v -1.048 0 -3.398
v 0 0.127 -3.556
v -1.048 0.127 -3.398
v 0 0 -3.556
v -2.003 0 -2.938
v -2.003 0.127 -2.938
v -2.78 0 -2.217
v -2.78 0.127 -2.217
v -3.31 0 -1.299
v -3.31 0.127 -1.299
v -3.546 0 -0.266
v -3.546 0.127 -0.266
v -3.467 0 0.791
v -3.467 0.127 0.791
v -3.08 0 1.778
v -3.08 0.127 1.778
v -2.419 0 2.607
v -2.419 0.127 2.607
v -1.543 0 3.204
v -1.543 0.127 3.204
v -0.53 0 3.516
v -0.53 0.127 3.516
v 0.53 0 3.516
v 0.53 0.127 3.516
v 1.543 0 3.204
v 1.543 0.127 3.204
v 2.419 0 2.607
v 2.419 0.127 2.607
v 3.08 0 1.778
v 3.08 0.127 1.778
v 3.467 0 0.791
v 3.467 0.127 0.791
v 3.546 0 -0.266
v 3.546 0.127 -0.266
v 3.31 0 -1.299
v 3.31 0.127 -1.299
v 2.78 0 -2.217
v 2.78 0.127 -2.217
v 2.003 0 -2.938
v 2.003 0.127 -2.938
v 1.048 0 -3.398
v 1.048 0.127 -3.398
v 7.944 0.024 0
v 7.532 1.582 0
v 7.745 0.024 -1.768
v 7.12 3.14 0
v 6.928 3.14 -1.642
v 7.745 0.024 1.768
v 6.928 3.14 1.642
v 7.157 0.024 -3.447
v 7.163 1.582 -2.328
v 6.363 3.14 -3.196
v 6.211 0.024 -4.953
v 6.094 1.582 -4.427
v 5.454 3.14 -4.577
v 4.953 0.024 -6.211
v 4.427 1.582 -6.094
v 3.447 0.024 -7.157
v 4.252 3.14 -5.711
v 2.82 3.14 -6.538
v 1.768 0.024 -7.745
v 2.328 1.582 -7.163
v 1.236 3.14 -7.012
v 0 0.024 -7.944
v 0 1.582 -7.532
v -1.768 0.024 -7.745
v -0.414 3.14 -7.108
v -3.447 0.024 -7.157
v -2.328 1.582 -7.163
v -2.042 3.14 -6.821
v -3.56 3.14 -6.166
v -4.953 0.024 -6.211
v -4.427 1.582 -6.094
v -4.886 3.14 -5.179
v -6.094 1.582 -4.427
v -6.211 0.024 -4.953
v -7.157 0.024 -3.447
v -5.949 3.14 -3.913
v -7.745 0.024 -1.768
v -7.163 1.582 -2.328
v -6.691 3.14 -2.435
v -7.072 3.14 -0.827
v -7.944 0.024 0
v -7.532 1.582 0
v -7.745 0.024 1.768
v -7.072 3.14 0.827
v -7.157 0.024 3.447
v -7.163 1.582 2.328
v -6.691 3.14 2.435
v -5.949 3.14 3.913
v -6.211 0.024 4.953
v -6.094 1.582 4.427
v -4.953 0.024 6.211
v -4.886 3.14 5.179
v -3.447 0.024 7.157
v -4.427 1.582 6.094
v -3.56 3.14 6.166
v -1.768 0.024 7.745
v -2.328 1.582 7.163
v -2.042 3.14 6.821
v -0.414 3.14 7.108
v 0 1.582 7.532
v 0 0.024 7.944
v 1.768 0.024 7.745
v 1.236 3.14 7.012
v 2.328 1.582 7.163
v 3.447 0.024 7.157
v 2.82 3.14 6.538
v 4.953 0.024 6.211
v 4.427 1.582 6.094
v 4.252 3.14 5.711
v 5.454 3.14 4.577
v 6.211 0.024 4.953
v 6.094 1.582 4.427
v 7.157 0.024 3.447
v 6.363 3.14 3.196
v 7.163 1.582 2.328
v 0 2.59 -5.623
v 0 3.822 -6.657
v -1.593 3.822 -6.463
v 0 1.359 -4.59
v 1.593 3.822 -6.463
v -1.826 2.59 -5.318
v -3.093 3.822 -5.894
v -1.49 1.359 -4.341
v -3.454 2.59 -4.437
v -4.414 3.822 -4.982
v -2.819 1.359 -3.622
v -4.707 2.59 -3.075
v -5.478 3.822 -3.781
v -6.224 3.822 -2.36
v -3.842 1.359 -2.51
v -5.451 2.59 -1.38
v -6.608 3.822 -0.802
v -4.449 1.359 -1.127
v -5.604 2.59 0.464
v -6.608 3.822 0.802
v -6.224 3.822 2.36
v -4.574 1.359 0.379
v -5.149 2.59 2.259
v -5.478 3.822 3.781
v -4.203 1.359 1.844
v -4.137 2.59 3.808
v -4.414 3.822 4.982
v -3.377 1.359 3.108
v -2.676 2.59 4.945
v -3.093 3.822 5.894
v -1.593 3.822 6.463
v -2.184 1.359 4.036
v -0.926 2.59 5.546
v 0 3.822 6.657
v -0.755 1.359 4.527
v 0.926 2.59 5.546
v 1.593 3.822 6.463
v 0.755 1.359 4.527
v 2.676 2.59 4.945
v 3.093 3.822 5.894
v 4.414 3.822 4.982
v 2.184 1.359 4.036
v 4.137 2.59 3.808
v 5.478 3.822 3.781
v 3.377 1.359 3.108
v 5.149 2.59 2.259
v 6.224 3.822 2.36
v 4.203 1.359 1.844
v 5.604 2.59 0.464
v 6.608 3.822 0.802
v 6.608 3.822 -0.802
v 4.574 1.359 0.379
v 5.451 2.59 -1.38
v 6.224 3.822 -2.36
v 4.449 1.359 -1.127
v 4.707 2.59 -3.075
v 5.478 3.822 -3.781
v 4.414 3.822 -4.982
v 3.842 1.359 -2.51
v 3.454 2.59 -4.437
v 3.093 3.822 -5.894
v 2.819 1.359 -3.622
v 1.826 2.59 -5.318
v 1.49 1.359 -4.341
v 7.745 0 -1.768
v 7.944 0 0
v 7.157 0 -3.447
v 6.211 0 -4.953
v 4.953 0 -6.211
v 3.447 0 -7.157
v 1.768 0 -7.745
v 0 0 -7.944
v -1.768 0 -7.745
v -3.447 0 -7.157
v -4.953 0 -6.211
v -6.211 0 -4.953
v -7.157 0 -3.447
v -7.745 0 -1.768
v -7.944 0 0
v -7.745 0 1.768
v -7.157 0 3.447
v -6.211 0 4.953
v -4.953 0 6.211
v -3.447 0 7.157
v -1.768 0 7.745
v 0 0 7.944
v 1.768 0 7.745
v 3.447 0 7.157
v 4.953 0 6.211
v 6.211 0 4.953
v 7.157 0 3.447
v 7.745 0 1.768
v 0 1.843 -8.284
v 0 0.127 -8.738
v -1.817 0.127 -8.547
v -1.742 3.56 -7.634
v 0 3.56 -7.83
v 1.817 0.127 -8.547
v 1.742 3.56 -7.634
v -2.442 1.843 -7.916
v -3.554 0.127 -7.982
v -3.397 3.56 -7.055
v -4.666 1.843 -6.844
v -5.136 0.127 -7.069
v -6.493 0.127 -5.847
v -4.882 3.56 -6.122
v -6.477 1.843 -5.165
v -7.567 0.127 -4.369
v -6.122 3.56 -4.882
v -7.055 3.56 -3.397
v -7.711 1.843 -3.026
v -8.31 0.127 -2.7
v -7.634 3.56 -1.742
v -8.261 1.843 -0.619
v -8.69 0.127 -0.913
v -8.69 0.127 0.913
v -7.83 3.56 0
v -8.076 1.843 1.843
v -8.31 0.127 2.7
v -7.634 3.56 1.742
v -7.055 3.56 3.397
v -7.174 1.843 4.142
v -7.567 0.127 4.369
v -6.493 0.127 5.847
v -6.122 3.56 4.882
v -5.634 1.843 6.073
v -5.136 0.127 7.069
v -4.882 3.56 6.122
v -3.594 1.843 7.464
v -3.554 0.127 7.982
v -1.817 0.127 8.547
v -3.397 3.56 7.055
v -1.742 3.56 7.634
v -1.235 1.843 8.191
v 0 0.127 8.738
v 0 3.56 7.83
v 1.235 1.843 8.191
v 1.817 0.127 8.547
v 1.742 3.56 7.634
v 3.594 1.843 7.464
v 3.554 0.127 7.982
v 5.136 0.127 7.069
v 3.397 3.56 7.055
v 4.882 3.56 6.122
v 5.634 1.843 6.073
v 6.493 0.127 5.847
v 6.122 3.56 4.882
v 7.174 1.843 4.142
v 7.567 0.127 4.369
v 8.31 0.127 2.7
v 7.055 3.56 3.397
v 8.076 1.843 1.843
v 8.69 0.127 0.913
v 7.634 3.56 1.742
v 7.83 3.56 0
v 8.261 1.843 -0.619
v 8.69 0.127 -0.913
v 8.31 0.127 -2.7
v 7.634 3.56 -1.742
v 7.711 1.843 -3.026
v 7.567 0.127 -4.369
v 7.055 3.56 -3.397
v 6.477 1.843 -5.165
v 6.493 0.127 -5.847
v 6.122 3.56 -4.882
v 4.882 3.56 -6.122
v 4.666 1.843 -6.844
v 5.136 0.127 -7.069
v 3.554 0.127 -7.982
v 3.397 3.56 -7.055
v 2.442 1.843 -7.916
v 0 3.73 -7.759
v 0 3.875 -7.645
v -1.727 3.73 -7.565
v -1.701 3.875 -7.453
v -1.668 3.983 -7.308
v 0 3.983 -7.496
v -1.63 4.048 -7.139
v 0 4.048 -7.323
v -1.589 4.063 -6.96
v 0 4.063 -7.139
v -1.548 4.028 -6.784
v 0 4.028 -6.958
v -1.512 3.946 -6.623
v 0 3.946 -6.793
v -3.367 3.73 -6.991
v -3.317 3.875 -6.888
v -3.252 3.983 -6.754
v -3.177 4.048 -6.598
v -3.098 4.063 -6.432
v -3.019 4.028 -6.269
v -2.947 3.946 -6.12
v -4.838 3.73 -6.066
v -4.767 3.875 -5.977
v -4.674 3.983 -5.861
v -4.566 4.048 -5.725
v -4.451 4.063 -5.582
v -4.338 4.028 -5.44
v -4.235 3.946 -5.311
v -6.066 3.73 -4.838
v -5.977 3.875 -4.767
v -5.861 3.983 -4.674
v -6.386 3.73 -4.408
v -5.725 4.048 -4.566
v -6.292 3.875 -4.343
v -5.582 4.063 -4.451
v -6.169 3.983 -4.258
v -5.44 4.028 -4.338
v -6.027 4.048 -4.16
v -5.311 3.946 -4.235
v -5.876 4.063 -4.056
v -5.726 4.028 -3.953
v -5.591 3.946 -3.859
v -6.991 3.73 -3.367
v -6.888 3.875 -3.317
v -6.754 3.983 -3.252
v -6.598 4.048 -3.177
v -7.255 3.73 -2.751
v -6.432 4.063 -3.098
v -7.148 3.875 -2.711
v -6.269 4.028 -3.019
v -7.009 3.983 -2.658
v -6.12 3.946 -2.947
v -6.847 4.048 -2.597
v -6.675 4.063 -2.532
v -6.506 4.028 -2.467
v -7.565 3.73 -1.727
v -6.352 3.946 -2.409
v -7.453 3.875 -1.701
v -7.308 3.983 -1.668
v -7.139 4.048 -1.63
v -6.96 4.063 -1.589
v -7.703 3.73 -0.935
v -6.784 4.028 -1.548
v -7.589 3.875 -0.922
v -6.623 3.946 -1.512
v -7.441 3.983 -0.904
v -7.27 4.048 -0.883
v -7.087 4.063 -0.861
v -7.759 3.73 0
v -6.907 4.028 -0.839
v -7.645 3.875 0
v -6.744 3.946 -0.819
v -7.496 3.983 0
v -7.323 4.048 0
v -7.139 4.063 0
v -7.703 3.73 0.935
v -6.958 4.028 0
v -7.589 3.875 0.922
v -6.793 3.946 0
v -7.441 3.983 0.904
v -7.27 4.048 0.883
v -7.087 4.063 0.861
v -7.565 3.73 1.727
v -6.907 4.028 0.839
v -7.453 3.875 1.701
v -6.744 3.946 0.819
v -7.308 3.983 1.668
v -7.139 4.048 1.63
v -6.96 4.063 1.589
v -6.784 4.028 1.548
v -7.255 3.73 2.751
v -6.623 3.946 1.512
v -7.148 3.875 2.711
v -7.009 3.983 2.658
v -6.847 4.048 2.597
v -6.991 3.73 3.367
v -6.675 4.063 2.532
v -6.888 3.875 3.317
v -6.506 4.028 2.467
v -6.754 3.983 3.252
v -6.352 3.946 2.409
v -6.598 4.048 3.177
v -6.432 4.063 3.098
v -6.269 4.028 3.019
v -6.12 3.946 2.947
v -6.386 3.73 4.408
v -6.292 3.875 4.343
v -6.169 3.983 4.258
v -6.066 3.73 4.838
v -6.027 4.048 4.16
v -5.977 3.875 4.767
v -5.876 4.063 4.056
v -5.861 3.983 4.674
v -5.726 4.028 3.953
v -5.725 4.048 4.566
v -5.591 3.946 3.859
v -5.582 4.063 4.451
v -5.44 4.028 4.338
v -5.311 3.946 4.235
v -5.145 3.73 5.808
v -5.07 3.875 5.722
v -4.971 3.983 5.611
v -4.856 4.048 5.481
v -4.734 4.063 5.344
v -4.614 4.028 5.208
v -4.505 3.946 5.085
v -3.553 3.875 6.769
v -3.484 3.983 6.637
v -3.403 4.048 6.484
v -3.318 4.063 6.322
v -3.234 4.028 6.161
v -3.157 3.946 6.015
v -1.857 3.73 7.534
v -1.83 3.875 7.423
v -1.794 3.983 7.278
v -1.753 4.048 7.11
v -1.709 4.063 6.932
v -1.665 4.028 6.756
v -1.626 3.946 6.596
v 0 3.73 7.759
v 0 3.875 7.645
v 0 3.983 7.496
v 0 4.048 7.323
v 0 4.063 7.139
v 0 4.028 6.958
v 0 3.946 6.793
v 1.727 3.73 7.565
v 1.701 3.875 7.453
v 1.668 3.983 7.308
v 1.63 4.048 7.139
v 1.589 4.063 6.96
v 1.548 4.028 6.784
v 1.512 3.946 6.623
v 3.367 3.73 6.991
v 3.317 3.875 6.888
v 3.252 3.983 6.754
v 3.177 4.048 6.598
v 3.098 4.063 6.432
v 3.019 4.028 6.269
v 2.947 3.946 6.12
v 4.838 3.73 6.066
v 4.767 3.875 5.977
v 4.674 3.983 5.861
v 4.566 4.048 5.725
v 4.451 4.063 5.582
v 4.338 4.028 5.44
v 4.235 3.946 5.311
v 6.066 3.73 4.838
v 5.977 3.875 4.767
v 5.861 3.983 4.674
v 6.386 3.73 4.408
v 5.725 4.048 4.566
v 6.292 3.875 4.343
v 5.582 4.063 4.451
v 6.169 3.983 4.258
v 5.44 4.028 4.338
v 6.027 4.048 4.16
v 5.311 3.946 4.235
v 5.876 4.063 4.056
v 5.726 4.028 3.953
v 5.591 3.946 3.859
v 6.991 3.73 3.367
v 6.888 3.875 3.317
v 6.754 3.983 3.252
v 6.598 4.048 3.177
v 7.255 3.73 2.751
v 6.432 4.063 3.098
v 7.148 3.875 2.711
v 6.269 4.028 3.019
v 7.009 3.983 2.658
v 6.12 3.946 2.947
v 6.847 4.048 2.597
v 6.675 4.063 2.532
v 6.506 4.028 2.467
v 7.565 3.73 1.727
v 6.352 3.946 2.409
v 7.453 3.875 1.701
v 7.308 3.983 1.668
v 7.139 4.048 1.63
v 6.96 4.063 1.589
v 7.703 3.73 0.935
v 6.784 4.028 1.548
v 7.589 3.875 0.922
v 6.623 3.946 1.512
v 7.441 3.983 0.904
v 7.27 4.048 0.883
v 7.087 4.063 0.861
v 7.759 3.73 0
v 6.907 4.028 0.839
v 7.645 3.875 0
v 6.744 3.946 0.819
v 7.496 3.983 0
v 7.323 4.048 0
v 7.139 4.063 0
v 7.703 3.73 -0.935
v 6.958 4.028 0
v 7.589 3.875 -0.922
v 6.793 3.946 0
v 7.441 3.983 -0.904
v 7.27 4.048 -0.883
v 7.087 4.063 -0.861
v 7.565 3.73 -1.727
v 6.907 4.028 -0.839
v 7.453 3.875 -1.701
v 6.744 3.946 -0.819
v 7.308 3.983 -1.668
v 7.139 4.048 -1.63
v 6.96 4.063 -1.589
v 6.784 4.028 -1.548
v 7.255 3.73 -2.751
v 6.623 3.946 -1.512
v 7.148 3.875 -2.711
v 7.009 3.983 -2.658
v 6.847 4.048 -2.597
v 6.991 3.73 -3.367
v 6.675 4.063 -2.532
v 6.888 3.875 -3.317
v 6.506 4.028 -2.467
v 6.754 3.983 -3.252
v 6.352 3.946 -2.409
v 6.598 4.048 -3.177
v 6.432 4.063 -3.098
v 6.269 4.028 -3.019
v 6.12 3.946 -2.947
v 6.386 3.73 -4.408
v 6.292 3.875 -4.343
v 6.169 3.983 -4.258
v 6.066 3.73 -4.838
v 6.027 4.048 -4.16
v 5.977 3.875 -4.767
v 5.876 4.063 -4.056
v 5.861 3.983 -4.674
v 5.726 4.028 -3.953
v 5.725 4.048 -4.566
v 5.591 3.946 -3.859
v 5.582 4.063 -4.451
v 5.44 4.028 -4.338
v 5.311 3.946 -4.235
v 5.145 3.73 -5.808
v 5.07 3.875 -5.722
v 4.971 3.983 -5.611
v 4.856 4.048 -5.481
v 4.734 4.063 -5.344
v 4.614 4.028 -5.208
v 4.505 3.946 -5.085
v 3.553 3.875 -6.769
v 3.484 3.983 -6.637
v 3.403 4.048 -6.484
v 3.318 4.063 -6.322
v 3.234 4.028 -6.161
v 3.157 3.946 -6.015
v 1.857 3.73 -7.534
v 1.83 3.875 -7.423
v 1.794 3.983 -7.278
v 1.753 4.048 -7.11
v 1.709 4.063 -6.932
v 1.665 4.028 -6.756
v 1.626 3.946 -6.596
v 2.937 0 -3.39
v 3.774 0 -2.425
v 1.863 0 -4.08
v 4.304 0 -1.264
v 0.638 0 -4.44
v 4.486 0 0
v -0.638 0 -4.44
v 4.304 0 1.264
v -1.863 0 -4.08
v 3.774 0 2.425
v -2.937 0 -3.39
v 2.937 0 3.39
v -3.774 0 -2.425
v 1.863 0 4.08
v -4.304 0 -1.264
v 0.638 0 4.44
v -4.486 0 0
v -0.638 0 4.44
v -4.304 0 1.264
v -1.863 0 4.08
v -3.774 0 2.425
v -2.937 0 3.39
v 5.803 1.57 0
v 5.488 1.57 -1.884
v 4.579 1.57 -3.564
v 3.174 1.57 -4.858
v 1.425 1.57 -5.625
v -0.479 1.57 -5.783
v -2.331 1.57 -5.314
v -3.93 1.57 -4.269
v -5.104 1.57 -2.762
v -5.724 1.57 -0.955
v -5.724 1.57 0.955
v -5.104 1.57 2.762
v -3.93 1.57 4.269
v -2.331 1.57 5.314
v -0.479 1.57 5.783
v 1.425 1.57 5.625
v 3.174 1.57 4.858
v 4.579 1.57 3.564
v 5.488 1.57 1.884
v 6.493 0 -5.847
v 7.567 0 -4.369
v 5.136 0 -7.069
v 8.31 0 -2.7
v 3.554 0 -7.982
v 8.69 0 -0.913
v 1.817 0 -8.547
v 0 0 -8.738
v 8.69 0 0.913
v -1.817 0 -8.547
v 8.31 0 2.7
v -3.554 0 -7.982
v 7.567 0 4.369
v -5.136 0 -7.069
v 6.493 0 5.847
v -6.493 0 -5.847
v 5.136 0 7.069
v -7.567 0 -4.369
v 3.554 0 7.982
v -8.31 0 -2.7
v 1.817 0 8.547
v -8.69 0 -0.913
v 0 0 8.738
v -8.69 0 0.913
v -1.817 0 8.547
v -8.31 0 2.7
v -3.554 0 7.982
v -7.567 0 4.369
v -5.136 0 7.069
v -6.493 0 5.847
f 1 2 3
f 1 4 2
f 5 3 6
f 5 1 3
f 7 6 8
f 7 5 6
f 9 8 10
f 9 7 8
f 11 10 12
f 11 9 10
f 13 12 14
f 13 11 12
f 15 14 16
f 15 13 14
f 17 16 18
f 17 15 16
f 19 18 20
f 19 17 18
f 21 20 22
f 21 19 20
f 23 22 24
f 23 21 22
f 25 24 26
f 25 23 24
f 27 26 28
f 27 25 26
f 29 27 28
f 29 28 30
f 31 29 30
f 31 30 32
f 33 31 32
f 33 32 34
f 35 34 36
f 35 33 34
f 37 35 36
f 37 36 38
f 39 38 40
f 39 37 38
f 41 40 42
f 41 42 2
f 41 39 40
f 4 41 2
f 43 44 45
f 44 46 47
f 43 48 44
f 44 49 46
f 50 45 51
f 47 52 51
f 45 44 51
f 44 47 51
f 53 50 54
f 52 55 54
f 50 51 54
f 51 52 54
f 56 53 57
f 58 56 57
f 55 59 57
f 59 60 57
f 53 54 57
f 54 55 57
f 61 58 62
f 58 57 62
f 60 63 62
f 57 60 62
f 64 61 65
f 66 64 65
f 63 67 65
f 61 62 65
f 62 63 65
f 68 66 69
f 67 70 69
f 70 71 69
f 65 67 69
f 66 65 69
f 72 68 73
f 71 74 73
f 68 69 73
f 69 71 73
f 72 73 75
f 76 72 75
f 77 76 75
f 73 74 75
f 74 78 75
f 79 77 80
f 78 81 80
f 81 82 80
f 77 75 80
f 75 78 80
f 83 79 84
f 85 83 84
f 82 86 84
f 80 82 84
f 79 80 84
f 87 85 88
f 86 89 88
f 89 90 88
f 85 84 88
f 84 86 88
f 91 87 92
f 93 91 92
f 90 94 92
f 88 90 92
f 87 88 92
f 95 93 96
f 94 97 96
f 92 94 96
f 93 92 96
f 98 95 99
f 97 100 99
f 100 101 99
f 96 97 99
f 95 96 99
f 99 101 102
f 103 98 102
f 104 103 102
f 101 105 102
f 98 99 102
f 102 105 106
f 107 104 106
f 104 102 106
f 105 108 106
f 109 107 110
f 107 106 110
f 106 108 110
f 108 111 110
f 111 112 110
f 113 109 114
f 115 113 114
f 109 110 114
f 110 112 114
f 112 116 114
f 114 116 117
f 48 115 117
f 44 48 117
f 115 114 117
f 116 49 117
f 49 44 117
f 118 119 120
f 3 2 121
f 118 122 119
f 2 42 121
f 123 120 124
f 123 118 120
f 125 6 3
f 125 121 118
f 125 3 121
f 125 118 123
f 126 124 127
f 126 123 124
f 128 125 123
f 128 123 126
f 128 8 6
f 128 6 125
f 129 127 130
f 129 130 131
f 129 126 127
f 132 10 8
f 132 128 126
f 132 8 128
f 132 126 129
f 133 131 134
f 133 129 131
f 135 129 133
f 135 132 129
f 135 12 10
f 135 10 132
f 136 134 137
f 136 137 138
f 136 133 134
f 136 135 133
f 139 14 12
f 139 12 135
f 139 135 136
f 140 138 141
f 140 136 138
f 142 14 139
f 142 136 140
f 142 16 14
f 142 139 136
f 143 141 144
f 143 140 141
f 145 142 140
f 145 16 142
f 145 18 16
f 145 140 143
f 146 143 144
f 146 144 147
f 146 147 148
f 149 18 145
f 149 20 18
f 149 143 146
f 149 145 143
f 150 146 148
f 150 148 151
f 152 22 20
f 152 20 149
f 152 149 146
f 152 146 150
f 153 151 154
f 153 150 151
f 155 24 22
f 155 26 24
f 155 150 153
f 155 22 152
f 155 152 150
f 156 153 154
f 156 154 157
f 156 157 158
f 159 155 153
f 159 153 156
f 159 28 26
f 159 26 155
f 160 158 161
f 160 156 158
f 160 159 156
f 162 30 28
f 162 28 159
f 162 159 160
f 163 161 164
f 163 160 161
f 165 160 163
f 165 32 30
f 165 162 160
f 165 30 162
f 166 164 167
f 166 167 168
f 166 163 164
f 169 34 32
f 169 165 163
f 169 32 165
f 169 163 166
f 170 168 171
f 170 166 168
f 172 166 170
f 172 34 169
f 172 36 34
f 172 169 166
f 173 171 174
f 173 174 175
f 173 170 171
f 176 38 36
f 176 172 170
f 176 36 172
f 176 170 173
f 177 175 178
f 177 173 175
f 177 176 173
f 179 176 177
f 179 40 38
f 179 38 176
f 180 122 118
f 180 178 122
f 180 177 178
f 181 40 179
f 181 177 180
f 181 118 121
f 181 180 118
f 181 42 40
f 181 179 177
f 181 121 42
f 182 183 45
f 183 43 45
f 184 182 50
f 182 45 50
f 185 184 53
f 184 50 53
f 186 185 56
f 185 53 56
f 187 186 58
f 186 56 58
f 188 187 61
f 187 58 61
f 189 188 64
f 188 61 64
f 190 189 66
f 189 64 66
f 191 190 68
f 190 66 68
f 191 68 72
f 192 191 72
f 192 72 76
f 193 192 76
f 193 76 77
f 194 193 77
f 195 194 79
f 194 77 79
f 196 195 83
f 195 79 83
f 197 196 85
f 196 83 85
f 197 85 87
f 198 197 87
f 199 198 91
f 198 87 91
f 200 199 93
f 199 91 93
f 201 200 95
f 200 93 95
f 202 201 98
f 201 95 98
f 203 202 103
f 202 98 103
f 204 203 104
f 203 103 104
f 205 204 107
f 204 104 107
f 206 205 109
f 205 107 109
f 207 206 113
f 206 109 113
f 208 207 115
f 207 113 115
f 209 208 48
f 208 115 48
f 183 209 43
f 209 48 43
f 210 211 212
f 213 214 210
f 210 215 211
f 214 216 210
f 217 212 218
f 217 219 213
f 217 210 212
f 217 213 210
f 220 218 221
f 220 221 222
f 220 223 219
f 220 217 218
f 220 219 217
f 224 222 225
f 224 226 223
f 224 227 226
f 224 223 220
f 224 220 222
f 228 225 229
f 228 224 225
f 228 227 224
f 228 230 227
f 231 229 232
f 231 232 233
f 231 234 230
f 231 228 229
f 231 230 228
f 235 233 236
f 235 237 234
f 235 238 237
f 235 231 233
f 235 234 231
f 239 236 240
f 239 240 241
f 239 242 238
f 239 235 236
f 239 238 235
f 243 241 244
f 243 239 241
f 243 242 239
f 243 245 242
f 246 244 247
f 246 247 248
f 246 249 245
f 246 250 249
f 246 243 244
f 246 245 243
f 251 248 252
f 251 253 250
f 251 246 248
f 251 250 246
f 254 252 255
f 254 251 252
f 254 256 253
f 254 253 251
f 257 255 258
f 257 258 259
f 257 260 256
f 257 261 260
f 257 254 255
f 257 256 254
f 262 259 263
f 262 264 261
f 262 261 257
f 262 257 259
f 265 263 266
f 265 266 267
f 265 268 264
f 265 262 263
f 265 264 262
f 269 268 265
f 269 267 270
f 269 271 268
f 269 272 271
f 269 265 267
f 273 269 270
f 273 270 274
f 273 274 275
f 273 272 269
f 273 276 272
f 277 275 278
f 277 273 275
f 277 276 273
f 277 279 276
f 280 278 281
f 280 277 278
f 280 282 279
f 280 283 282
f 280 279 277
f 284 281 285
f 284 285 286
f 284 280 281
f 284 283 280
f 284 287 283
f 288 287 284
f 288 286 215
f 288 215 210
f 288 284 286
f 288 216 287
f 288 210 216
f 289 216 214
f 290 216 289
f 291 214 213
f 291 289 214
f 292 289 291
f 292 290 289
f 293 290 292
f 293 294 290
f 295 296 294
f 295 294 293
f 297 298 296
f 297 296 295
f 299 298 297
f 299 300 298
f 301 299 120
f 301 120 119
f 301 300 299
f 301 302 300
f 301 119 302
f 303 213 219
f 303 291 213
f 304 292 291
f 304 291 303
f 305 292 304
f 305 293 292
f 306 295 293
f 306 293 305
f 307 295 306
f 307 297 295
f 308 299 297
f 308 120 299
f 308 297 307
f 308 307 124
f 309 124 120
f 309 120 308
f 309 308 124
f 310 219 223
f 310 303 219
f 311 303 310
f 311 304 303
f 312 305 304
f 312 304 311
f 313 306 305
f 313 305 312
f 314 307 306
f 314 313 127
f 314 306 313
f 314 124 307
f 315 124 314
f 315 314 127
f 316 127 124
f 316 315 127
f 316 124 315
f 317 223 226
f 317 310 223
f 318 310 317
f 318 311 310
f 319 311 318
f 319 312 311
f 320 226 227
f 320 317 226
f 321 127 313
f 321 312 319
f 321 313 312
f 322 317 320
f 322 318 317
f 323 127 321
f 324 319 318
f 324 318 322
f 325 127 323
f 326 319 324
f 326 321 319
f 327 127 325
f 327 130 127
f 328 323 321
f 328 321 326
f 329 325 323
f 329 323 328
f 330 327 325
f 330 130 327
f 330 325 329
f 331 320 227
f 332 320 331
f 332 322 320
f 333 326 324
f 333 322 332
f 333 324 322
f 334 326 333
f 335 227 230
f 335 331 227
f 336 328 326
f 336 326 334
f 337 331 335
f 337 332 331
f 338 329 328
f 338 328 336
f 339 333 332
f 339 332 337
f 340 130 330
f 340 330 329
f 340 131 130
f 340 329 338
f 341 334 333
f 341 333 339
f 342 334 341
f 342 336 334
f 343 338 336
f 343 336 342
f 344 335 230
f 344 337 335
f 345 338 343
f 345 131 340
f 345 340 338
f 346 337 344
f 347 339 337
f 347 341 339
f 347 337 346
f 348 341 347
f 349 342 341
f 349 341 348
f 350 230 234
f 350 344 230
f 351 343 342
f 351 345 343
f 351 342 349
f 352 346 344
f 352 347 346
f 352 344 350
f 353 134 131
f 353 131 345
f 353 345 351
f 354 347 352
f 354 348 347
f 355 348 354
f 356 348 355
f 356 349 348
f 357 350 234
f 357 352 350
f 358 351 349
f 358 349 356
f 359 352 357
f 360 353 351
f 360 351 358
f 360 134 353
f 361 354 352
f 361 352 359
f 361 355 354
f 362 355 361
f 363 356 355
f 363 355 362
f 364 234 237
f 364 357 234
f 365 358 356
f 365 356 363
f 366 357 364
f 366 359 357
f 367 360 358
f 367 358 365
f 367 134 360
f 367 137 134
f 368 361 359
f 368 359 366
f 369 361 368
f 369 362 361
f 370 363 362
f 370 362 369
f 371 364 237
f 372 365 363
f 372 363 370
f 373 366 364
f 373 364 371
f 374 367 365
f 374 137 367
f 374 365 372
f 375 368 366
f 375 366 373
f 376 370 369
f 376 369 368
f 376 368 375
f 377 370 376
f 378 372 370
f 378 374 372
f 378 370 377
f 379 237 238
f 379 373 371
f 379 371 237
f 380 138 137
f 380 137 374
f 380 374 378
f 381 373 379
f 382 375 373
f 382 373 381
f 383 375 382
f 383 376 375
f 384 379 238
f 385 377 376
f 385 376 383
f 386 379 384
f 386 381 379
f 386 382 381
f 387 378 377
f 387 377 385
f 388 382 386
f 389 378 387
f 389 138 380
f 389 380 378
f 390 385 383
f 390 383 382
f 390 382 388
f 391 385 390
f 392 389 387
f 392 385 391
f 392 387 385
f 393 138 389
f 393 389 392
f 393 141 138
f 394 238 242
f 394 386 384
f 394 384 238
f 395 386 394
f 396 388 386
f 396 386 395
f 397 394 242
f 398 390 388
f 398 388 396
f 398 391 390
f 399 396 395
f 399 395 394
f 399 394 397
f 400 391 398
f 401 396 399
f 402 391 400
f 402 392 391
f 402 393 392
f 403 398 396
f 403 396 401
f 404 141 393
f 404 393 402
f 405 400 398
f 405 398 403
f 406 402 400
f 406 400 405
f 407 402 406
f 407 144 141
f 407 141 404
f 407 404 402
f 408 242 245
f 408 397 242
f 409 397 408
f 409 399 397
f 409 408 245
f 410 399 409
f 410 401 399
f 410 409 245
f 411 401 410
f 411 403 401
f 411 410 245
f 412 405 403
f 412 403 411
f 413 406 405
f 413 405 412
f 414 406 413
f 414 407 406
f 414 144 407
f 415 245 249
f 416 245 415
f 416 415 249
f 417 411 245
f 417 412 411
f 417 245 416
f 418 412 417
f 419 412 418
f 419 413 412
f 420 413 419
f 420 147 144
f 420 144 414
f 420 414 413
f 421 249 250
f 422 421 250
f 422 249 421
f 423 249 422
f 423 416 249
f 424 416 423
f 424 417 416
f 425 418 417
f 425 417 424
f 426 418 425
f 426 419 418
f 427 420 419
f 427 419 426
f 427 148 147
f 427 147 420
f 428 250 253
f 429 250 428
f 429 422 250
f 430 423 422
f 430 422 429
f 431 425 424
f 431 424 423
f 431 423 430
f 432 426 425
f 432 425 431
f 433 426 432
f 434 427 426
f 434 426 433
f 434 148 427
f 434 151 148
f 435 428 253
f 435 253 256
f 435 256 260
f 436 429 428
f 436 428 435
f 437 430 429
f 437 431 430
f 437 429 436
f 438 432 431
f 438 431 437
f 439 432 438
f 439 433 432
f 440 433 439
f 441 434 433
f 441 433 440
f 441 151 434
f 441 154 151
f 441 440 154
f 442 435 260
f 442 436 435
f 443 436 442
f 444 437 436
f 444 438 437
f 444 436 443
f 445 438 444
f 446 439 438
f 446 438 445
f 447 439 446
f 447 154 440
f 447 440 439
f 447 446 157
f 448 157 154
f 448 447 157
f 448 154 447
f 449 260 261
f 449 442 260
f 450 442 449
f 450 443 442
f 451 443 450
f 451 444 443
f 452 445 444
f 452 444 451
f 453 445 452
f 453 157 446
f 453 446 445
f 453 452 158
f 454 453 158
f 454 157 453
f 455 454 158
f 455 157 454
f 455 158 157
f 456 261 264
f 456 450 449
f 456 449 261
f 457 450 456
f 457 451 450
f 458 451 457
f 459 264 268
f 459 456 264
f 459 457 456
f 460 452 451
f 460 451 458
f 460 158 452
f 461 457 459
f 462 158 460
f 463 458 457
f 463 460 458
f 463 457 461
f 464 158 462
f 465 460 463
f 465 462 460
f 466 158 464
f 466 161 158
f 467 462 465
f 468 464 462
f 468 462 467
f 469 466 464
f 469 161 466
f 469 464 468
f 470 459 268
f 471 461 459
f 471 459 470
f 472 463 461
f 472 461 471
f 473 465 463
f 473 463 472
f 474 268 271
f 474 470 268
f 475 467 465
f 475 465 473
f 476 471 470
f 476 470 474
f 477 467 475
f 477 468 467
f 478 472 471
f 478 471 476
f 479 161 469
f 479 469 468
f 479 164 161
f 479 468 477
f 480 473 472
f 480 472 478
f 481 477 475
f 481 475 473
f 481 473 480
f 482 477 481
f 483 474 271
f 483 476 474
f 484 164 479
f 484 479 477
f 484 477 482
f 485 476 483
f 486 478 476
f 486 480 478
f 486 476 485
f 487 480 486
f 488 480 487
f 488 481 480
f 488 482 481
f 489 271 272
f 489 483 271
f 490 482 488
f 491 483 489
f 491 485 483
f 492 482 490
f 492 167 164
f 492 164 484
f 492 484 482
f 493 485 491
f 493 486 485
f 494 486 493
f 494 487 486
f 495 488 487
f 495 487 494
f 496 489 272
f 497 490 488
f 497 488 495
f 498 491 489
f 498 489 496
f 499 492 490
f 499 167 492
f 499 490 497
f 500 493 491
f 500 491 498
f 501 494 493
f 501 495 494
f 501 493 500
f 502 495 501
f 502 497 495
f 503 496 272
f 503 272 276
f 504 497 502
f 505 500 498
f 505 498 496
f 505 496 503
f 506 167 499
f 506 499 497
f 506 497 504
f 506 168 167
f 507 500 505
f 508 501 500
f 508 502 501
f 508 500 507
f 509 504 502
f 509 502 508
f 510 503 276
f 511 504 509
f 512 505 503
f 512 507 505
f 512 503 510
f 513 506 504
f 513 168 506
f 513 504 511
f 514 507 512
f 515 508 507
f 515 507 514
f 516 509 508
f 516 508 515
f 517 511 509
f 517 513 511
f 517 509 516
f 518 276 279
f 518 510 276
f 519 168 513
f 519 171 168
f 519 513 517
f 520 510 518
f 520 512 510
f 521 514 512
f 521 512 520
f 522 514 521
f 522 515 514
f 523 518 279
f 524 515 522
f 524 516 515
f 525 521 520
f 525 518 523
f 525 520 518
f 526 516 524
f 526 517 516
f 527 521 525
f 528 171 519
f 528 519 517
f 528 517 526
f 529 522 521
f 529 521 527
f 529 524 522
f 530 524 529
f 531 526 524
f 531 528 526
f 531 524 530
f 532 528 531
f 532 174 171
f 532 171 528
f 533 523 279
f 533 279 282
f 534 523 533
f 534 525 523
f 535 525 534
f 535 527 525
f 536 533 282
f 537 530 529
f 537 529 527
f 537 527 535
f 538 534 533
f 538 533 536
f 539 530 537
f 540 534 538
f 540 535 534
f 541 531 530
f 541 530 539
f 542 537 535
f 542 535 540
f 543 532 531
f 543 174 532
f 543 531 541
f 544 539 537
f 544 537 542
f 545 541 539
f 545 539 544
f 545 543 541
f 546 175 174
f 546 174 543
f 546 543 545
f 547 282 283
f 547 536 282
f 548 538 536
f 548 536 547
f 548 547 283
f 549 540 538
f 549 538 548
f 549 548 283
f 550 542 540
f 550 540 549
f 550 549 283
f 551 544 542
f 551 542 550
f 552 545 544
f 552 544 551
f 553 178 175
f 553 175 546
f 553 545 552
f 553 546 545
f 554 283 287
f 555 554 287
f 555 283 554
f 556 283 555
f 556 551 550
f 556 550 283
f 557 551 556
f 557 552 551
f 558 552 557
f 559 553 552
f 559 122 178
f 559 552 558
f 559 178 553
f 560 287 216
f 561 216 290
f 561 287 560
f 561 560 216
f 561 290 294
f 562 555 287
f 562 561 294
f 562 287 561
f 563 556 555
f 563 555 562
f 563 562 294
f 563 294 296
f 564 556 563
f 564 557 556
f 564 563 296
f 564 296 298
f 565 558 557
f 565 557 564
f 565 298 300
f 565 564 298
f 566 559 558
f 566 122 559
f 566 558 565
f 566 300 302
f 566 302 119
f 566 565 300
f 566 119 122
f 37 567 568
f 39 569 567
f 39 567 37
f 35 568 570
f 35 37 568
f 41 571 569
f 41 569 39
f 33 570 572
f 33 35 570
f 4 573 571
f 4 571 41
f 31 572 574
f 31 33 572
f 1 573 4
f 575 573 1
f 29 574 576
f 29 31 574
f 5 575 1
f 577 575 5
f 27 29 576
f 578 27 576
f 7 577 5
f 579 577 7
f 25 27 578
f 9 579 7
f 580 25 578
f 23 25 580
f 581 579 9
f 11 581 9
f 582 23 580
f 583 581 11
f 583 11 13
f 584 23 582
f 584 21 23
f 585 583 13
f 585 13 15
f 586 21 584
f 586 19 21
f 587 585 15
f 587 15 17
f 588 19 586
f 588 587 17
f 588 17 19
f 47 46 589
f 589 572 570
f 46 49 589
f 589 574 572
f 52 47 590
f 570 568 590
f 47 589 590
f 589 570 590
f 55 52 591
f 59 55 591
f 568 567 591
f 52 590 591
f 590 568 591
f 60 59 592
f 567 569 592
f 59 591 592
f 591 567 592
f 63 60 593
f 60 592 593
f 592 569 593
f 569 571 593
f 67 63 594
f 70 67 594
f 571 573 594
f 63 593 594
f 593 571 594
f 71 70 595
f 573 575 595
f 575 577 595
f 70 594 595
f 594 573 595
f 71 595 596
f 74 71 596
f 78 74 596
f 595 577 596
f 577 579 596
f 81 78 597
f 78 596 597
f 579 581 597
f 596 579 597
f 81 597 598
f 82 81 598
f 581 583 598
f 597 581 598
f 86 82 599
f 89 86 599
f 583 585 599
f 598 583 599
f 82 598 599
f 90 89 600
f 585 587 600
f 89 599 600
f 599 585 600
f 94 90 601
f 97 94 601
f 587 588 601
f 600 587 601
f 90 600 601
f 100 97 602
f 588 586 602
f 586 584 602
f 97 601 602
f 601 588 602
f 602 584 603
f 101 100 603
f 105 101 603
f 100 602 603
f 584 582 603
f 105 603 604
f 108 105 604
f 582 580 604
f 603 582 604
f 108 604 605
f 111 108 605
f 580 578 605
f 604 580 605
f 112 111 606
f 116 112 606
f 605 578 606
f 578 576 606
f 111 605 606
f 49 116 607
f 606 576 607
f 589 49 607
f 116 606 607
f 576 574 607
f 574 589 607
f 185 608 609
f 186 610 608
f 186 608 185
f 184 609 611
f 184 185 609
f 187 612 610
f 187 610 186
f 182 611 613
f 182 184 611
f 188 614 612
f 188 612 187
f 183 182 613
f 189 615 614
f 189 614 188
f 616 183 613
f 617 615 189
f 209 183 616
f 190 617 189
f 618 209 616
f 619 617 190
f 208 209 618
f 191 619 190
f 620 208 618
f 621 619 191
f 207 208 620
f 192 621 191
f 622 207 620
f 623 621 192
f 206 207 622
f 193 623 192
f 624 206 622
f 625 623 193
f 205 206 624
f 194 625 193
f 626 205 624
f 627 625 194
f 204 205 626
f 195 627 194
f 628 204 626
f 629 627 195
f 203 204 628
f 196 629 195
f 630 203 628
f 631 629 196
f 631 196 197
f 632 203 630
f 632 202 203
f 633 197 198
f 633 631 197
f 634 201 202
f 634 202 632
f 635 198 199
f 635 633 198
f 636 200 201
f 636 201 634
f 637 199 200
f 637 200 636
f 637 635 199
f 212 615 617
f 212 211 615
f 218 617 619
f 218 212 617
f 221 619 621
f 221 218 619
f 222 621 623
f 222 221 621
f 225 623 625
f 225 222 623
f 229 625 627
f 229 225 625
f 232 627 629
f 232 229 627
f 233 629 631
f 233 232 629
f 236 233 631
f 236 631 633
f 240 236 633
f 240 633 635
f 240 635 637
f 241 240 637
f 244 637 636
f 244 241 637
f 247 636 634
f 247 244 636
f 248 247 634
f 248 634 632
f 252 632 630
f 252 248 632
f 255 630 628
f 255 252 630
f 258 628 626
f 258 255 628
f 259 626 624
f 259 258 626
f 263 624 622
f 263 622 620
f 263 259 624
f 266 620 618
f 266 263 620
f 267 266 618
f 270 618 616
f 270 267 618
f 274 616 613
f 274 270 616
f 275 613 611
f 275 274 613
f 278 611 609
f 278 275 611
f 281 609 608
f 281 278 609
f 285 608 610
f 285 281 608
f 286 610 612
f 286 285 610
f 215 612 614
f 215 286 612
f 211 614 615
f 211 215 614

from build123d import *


# Read off the part's stored shape, not the designer's step: Shell2
with BuildPart() as part:
    # Sketch1 → Revolve1 (revolve)
    with BuildSketch(Plane.XY, mode=Mode.PRIVATE) as revolve1_sk:
        with BuildLine():
            Line((-8.7376, 0), (-8.7376, 0.127))
            Line((-8.7376, 0.127), (-7.830223739, 3.559760253))
            ThreePointArc((-7.830223739, 3.559760253), (-7.323100489, 4.047695704), (-6.656513532, 3.822048141))
            Line((-6.656513532, 3.822048141), (-3.556, 0.127))
            Line((-3.556, 0.127), (-3.556, 0))
            Line((-3.556, 0), (-8.7376, 0))
        make_face()
    revolve(revolve1_sk.sketch.rotate(Axis((0, 0, 0), (0, 1, 0)), 270), axis=Axis((0, 0, 0), (0, 1, 0)))

    # Shell2 outline → Shell2 (revolve, cut)
    with BuildSketch(Plane.XY):
        Polygon((7.120216638, 3.139812195), (4.485601383, 0), (7.94385, 0), (7.94385, 0.023865712), align=None)
    revolve(axis=Axis((0, 0, 0), (0, 1, 0)), mode=Mode.SUBTRACT)


solid = part.part
